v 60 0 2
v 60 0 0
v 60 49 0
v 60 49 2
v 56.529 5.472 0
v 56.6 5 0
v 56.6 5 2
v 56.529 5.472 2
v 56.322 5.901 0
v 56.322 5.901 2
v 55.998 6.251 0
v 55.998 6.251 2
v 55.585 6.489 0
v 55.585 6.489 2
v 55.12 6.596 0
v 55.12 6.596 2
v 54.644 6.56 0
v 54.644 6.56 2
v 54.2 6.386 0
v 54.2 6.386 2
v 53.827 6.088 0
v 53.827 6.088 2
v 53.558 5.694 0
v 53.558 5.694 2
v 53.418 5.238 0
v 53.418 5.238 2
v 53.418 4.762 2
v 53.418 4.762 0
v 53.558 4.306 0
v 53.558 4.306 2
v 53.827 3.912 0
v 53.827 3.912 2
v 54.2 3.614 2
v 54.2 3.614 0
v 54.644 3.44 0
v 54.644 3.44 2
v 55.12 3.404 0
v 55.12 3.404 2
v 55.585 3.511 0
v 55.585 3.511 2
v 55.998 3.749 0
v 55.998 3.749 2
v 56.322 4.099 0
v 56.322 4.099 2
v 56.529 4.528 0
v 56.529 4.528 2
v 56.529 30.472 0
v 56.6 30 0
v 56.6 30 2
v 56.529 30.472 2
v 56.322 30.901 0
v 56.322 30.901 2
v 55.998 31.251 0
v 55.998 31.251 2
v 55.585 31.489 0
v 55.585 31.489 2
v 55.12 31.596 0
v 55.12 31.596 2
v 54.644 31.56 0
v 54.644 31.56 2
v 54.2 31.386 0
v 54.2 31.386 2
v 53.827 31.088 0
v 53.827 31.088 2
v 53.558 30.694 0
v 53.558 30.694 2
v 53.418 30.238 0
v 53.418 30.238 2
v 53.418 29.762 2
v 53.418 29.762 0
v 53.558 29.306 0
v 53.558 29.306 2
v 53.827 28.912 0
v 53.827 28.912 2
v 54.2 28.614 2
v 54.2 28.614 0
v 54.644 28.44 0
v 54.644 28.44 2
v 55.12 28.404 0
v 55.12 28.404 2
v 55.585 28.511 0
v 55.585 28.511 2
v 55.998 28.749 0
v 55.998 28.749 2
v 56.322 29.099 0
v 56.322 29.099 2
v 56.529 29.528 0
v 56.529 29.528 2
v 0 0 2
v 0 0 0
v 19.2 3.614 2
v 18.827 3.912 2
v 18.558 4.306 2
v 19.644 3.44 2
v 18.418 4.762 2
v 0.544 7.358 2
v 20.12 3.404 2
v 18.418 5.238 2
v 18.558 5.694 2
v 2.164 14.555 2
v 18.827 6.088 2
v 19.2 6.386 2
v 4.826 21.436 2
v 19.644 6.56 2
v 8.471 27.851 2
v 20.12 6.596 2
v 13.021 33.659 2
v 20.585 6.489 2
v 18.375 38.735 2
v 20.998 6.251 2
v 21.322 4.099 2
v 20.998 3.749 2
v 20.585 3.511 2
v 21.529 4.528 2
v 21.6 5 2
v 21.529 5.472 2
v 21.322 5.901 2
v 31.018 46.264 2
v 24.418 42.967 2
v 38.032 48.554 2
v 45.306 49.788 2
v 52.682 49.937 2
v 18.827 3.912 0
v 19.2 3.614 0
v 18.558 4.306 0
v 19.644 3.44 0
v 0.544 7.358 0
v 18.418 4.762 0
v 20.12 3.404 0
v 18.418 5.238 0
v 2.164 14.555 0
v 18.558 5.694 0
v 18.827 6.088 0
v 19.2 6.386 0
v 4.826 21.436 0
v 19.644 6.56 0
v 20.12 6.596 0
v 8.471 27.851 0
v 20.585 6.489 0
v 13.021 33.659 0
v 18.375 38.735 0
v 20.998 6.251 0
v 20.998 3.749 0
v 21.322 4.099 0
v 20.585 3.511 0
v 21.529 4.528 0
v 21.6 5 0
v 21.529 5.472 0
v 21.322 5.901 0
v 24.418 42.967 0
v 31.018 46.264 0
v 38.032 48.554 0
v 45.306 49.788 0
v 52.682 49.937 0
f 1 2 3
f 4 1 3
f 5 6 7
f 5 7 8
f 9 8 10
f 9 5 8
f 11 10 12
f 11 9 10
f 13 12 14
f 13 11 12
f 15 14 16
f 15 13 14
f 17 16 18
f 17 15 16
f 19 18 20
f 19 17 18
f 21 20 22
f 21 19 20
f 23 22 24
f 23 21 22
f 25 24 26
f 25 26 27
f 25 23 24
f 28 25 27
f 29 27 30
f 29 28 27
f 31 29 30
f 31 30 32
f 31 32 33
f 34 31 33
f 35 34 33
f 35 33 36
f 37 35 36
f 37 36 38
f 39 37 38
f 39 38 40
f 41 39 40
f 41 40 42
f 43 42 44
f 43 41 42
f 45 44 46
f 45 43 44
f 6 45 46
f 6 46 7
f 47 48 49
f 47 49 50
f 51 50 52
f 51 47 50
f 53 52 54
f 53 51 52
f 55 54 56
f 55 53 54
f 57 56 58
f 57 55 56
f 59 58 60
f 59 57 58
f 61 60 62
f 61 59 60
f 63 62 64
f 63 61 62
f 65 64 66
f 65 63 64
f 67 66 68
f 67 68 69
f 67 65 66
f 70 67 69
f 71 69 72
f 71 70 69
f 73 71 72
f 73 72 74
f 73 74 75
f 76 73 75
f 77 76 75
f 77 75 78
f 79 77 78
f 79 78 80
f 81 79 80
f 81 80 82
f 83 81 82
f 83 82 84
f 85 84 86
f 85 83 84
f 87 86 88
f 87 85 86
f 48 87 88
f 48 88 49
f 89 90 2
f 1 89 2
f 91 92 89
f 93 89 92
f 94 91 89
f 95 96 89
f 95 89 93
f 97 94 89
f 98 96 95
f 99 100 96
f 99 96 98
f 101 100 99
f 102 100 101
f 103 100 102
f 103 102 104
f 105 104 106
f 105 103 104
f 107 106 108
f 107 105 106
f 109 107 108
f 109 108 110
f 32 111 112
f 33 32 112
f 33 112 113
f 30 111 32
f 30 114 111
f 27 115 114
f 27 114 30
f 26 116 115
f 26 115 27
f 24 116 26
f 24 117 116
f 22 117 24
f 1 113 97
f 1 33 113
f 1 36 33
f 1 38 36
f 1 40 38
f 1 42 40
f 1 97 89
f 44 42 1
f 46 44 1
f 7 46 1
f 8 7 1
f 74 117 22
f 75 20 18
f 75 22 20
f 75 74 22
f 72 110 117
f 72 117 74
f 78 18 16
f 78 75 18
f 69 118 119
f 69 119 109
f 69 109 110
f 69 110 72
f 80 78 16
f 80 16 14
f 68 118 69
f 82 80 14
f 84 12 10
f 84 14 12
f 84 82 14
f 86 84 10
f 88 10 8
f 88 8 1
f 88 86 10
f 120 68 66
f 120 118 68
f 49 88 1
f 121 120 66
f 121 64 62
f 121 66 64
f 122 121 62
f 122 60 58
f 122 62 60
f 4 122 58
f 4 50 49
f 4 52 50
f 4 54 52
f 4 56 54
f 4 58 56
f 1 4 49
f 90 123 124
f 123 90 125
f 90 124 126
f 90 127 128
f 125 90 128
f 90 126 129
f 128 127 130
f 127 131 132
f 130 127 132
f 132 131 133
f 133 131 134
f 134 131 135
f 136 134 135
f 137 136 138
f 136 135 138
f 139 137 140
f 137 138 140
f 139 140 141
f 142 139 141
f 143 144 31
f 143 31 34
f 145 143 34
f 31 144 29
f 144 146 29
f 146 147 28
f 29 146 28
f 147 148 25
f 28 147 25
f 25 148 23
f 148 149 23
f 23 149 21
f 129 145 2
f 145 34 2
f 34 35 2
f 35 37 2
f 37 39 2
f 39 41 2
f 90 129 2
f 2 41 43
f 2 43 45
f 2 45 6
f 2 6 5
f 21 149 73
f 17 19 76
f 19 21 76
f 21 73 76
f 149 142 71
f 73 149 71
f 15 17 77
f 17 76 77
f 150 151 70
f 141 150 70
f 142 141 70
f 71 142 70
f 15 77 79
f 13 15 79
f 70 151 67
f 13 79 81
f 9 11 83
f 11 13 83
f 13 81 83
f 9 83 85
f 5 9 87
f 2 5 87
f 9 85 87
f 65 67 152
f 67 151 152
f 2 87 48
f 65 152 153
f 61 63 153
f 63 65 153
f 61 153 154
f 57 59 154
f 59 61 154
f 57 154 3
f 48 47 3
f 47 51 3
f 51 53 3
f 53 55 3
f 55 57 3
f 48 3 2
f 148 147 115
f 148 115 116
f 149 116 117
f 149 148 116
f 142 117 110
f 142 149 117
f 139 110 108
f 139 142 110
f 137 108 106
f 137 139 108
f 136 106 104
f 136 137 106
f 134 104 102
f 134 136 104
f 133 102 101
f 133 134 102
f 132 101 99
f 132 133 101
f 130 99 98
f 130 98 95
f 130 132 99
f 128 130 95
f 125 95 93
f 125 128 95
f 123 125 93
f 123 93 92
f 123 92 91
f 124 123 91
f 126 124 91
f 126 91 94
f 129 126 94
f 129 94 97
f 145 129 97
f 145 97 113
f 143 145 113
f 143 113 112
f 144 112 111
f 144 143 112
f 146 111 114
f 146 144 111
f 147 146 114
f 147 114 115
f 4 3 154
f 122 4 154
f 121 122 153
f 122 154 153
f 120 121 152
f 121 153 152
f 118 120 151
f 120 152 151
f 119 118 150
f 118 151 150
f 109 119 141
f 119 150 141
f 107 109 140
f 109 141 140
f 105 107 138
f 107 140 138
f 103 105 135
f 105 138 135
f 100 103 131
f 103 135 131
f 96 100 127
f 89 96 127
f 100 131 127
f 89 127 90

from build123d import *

# Parameters (mm, degrees)
MODEL_R                         = 1.6
AUFSATZ_LINEAR_AUSTRAGEN1_DEPTH = 2


with BuildPart() as part:
    # Model → Aufsatz-Linear austragen1 (new body)
    with BuildSketch(Plane.XY):
        with BuildLine():
            Line((60, 0), (60, 49))
            ThreePointArc((60, 49), (18.375108617, 38.734560877), (0, 0))
            Line((0, 0), (60, 0))
        make_face()
        with Locations((20, 5)):
            Circle(MODEL_R, mode=Mode.SUBTRACT)
        with Locations((55, 30)):
            Circle(MODEL_R, mode=Mode.SUBTRACT)
        with Locations((55, 5)):
            Circle(MODEL_R, mode=Mode.SUBTRACT)
    extrude(amount=AUFSATZ_LINEAR_AUSTRAGEN1_DEPTH)


solid = part.part
